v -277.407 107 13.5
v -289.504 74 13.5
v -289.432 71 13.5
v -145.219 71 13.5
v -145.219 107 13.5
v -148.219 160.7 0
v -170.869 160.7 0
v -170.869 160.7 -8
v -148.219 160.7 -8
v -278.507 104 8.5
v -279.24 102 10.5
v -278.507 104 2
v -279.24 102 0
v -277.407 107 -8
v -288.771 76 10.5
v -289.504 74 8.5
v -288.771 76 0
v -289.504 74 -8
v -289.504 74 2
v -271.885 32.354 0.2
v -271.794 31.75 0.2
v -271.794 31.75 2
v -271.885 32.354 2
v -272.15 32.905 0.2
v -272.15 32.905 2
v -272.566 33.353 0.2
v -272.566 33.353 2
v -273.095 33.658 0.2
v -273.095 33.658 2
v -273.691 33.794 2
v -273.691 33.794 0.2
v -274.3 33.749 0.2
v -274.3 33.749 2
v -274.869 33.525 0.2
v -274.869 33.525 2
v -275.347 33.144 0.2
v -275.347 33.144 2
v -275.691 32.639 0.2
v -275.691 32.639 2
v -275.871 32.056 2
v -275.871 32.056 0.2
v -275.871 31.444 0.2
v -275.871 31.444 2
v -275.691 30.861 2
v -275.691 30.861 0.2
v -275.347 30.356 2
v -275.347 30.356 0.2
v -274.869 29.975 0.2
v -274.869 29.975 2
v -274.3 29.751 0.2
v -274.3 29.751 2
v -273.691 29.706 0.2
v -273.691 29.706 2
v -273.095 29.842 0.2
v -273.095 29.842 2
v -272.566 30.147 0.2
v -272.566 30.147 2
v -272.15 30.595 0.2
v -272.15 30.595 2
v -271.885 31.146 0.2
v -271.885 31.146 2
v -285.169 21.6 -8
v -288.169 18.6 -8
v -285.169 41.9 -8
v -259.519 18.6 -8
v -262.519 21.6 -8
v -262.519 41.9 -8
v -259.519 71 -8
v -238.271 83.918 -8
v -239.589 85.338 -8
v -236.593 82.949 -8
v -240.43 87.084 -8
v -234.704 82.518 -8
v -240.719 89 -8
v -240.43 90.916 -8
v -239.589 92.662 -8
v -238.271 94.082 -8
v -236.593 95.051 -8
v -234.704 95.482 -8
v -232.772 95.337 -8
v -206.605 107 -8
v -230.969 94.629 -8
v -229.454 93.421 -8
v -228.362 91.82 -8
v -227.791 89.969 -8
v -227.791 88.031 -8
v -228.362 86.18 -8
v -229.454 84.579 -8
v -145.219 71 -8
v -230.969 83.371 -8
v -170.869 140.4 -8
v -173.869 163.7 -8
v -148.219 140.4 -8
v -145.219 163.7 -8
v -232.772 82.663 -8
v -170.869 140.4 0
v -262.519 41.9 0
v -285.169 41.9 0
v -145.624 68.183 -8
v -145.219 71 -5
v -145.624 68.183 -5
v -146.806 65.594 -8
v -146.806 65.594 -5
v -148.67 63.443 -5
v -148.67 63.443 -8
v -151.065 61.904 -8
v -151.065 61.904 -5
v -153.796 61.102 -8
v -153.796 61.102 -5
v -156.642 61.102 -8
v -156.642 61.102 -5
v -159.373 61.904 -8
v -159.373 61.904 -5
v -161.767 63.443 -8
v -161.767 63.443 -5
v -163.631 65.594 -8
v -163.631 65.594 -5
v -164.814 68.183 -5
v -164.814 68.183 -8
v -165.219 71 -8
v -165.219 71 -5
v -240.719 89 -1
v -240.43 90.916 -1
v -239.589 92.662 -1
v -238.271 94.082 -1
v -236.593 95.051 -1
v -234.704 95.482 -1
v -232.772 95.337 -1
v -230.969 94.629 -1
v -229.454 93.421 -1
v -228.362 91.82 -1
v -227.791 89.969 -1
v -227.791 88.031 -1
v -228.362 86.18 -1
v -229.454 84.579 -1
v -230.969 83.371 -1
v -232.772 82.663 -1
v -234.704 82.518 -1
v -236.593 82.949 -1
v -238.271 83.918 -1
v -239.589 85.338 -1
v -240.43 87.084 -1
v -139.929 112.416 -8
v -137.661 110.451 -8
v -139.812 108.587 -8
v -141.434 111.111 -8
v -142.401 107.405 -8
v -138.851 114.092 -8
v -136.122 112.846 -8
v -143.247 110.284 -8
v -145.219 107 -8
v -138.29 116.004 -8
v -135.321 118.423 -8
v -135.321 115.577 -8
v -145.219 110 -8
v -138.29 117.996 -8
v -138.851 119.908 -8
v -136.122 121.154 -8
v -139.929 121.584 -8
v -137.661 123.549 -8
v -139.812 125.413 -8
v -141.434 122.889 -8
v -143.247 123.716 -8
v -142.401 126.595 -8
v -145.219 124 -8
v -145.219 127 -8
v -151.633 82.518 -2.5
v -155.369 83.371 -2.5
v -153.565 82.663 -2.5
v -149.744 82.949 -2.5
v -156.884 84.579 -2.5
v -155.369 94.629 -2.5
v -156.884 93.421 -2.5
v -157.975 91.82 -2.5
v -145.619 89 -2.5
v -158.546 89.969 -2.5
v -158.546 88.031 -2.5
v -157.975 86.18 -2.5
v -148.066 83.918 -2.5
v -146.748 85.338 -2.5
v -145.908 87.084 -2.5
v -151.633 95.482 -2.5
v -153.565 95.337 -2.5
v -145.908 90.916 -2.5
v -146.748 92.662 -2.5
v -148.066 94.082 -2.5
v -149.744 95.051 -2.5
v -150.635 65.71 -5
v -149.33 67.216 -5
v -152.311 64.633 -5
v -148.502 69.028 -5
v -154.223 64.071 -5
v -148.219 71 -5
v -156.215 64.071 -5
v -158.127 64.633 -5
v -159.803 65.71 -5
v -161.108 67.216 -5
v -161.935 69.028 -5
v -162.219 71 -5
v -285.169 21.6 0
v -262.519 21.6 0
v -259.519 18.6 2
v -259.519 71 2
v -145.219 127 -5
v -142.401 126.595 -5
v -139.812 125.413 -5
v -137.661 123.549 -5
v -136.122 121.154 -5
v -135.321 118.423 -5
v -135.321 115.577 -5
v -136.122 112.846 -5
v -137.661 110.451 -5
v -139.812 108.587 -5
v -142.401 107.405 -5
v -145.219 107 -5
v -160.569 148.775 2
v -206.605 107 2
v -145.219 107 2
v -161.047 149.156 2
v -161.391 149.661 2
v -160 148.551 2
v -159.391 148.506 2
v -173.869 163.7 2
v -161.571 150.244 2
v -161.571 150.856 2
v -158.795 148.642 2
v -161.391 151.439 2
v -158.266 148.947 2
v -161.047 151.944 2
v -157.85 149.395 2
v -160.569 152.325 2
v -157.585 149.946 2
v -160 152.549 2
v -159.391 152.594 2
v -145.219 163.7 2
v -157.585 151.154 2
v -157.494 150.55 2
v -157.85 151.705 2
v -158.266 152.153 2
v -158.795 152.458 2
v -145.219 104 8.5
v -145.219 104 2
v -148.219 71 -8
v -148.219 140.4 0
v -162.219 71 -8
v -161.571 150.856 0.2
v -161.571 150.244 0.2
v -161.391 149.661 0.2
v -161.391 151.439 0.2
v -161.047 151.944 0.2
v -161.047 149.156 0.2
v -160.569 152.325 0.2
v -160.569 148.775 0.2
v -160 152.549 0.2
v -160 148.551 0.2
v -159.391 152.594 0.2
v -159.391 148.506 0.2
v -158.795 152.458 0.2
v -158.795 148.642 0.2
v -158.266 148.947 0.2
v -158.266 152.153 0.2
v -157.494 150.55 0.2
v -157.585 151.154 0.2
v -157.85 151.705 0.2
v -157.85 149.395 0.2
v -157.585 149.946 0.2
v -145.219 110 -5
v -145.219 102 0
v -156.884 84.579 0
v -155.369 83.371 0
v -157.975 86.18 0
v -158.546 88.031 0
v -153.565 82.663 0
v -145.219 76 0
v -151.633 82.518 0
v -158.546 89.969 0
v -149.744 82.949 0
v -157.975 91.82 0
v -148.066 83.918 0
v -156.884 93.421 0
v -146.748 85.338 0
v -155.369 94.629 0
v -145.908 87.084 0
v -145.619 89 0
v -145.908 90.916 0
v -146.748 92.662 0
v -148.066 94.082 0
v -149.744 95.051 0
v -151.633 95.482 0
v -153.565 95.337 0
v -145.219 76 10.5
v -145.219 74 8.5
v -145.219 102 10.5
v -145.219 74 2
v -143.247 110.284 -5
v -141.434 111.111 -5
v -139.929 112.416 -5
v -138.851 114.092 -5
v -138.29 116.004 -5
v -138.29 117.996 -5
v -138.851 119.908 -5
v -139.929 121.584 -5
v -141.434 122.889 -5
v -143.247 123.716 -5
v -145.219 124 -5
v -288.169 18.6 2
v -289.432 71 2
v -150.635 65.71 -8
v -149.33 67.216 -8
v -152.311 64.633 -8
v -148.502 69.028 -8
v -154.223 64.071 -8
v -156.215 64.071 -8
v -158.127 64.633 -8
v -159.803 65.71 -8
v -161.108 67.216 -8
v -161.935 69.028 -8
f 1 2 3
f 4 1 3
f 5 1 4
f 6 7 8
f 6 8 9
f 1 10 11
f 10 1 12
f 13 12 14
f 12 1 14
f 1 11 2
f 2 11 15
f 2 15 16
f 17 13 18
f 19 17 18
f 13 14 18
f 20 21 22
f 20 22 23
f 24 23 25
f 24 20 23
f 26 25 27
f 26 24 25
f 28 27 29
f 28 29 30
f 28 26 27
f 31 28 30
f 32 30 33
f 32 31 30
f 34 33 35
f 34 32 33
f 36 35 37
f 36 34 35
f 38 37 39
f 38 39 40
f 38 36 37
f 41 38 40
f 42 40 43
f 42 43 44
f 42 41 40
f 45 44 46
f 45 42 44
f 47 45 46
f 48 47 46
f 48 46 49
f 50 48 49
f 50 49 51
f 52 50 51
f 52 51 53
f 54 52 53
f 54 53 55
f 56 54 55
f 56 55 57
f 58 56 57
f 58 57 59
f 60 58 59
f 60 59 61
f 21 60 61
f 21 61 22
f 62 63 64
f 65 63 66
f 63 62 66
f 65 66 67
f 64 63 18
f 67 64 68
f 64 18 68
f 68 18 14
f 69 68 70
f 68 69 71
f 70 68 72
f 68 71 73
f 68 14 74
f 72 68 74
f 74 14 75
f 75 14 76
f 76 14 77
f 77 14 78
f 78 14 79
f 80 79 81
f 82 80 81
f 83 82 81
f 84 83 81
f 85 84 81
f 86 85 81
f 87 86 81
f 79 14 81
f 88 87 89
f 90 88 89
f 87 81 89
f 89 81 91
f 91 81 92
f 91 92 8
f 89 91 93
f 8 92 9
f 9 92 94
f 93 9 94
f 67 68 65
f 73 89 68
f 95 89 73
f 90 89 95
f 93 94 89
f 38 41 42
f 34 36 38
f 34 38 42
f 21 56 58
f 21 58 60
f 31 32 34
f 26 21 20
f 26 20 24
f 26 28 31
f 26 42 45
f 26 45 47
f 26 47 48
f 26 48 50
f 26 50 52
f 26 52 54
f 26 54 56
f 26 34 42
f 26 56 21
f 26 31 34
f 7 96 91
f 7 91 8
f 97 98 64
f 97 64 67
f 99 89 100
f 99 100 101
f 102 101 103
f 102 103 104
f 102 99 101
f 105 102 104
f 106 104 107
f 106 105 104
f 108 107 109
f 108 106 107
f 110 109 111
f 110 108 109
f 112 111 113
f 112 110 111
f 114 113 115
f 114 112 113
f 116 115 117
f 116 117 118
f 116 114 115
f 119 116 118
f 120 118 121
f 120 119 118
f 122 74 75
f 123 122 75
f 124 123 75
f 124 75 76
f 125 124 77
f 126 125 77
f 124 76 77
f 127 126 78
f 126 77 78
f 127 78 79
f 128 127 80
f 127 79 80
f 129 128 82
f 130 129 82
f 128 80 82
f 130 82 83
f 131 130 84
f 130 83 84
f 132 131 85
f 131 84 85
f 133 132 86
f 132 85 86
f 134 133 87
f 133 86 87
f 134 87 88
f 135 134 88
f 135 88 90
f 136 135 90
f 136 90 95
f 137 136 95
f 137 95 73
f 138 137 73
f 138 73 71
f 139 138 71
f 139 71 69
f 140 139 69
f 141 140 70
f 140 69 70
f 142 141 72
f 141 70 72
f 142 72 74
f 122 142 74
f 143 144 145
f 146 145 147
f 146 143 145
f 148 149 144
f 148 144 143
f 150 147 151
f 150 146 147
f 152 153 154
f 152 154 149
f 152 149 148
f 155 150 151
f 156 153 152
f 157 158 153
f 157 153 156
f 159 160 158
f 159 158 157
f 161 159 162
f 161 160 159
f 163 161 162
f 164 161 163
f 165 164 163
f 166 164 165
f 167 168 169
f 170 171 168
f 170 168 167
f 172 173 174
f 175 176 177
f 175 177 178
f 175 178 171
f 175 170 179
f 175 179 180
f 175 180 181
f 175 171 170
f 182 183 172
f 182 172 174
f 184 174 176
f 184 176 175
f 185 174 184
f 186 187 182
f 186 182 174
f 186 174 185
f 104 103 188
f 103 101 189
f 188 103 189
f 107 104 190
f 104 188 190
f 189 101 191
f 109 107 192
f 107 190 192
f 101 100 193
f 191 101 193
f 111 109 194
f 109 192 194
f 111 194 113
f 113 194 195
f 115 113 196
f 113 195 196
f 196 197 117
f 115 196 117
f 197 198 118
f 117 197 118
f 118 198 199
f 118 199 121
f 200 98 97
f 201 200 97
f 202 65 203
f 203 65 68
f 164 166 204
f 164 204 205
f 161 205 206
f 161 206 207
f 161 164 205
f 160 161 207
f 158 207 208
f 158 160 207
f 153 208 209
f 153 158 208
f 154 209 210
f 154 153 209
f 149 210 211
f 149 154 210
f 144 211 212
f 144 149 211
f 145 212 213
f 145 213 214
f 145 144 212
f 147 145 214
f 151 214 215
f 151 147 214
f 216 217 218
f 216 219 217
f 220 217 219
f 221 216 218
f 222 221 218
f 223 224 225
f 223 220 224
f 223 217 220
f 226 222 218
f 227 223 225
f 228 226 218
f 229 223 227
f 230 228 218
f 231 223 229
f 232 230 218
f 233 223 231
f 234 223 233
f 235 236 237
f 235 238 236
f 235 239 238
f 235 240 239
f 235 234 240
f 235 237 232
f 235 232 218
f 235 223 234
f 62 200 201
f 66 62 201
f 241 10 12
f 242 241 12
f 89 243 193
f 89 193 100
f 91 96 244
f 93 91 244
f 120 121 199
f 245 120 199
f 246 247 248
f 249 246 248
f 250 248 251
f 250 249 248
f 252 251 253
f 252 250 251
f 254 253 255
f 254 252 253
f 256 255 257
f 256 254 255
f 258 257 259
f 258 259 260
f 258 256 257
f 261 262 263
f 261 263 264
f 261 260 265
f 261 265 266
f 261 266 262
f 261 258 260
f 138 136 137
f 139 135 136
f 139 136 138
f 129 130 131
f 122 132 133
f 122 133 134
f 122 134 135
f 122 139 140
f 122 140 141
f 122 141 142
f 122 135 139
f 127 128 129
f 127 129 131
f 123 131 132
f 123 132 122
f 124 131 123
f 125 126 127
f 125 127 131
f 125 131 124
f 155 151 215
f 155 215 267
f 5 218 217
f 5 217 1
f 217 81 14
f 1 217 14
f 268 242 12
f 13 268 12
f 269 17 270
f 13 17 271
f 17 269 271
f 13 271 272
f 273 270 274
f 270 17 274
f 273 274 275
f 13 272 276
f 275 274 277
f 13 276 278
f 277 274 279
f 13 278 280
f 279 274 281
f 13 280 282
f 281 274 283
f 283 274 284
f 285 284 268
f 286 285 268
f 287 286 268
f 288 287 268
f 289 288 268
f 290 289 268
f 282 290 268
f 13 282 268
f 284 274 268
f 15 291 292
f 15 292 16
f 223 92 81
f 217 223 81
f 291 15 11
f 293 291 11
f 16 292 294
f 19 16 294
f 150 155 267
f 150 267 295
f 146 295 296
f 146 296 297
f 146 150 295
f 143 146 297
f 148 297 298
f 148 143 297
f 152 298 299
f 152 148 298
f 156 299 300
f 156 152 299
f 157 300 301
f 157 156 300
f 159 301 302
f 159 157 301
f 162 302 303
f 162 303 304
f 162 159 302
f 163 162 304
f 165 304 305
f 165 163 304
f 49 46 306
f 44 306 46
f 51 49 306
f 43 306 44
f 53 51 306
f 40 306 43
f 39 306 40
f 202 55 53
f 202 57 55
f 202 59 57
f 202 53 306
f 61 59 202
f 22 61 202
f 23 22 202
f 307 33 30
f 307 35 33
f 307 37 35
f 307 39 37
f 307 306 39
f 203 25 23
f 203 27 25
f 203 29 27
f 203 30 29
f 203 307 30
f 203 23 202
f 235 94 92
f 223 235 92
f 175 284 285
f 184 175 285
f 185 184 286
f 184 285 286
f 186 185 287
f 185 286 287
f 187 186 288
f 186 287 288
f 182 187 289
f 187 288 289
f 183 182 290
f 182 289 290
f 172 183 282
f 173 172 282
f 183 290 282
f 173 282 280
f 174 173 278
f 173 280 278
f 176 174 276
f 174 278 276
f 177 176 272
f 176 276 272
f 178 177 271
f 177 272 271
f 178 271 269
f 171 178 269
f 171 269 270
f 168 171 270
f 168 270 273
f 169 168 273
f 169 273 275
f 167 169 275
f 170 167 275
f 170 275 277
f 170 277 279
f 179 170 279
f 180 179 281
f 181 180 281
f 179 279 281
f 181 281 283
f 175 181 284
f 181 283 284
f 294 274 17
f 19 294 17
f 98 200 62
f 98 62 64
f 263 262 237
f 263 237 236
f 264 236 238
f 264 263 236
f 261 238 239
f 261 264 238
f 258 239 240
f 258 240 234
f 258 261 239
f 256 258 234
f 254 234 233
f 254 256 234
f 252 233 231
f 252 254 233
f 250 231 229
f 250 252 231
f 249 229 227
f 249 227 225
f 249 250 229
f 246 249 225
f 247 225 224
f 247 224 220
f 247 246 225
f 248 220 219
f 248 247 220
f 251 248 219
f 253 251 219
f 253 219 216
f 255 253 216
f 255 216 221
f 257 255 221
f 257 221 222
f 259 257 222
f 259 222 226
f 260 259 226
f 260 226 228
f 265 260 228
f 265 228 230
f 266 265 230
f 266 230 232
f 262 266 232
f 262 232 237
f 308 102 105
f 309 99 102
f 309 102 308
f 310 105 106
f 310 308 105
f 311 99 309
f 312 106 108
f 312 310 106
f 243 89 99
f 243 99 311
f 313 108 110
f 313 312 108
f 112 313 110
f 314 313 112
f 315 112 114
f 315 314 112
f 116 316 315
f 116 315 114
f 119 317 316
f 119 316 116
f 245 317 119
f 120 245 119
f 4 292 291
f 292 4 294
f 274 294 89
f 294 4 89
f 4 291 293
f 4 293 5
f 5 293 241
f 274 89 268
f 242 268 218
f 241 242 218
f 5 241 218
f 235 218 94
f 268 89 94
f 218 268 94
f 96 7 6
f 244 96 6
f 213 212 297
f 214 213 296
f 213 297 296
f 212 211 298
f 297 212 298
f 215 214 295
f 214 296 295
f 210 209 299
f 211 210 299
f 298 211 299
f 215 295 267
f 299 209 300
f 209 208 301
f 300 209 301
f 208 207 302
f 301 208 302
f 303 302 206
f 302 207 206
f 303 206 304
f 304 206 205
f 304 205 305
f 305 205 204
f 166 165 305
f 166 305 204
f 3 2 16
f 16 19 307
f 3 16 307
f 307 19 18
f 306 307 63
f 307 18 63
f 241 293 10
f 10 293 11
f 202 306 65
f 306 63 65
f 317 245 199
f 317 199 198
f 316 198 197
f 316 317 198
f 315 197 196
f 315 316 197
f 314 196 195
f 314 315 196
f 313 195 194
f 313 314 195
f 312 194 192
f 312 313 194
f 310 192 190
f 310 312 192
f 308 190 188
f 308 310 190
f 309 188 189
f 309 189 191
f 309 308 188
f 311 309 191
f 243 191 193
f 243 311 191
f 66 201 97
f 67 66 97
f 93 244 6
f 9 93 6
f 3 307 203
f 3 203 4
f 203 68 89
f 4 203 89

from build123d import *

# Parameters (mm, degrees)
SKETCH3_W             = 22.65000000000009
SKETCH3_H             = 20.30000000000004
SKETCH3_W_2           = 22.64999999999995
BOSS_EXTRUDE1_DEPTH   = 8
SKETCH3_4_R           = 2.049999999999966
SKETCH3_4_R_2         = 2.0499999999999923
BOSS_EXTRUDE2_DEPTH   = 2
BOSS_EXTRUDE3_DEPTH   = 13.5
SKETCH4_W             = 10.499999999999998
SKETCH4_H             = 30.000000000000014
CUT_EXTRUDE1_DEPTH    = 219.62824070668816
CHAMFER1_SIZE         = 2
SKETCH7_R             = 6.500000000000016
CUT_EXTRUDE3_DEPTH    = 2.5
SKETCH8_R             = 6.500000000000016
CUT_EXTRUDE4_DEPTH    = 7
BOSS_EXTRUDE4_DEPTH   = 3
BOSS_EXTRUDE4_2_DEPTH = 3
SKETCH3_9_R           = 2.0499999999999923
SKETCH3_9_R_2         = 2.049999999999966
BOSS_EXTRUDE5_DEPTH   = 0.2


with BuildPart() as part:
    # Sketch3 → Boss-Extrude1 (new body)
    with BuildSketch(Plane.XY):
        Polygon((-289.50446528221903, 74), (-288.1687500000001, 18.600000000000023), (-259.51875, 18.600000000000023), (-259.51875, 71), (-145.21875, 71), (-145.21875, 163.70000000000002), (-173.86874999999995, 163.70000000000002), (-206.60451026305154, 107), (-277.4071095129883, 106.99999999999999), align=None)
        with Locations((-273.84375000000006, 31.750000000000043)):
            Rectangle(SKETCH3_W, SKETCH3_H, mode=Mode.SUBTRACT)
        with Locations((-159.54375, 150.55)):
            Rectangle(SKETCH3_W_2, SKETCH3_H, mode=Mode.SUBTRACT)
    extrude(amount=-BOSS_EXTRUDE1_DEPTH)



with BuildPart() as body_2:
    # Sketch3<4> → Boss-Extrude2 (new body)
    with BuildSketch(Plane.XY):
        Polygon((-289.50446528221903, 74), (-288.1687500000001, 18.600000000000023), (-259.51875, 18.600000000000023), (-259.51875, 71), (-145.21875, 71), (-145.21875, 163.70000000000002), (-173.86874999999995, 163.70000000000002), (-206.60451026305154, 107), (-277.4071095129883, 106.99999999999999), align=None)
        with Locations((-273.84375, 31.749999999999986)):
            Circle(SKETCH3_4_R, mode=Mode.SUBTRACT)
        with Locations((-159.54375, 150.55)):
            Circle(SKETCH3_4_R_2, mode=Mode.SUBTRACT)
    extrude(amount=BOSS_EXTRUDE2_DEPTH)


with BuildPart() as part_1:
    add(part.part)

    add(body_2.part)  # Boss-Extrude3 merges body 2
    # Sketch3<8> → Boss-Extrude3 (add)
    with BuildSketch(Plane.XY):
        Polygon((-288.1687500000001, 77.64365611411853), (-288.1687500000001, 70.99999999999999), (-259.51875, 71), (-145.21875, 71), (-145.21875, 107), (-206.60451026305154, 107), (-277.4071095129883, 106.99999999999999), align=None)
        Polygon((-289.4321341297523, 70.99999999999999), (-288.1687500000001, 70.99999999999999), (-288.1687500000001, 77.64365611411853), (-289.50446528221903, 74), align=None)
    extrude(amount=BOSS_EXTRUDE3_DEPTH)

    # Sketch4 → Cut-Extrude1 (cut, through all)
    with BuildSketch(Plane(origin=(-145.21875, 0, 0), x_dir=(0, 0, -1), z_dir=(1, 0, 0))):
        with Locations((-5.249999999999999, 89)):
            Rectangle(SKETCH4_W, SKETCH4_H)
    extrude(amount=-CUT_EXTRUDE1_DEPTH, mode=Mode.SUBTRACT)

    # Chamfer1
    chamfer1_edges = [part_1.edges().sort_by_distance(p)[0] for p in [
        (-217.36160764110952, 74, 10.499999999999998),
        (-211.86280956418642, 104, 10.499999999999998),
        (-211.86280956418642, 104, 0),
        (-217.36160764110952, 74, 0),
    ]]
    chamfer(chamfer1_edges, length=CHAMFER1_SIZE)

    # Sketch7 → Cut-Extrude3 (cut)
    with BuildSketch(Plane.XY):
        with Locations((-152.11875000000003, 88.99999999999999)):
            Circle(SKETCH7_R)
    extrude(amount=-CUT_EXTRUDE3_DEPTH, mode=Mode.SUBTRACT)

    # Sketch8 → Cut-Extrude4 (cut)
    with BuildSketch(Plane(origin=(0, 0, -8), x_dir=(-1, 0, 0), z_dir=(0, 0, -1))):
        with Locations((234.21875, 89)):
            Circle(SKETCH8_R)
    extrude(amount=-CUT_EXTRUDE4_DEPTH, mode=Mode.SUBTRACT)

    # Sketch3<9> → Boss-Extrude5 (add)
    with BuildSketch(Plane.XY):
        with Locations((-159.54375, 150.55)):
            Circle(SKETCH3_9_R)
        with Locations((-273.84375, 31.749999999999986)):
            Circle(SKETCH3_9_R_2)
    extrude(amount=BOSS_EXTRUDE5_DEPTH)


with BuildPart() as body_2_2:
    # Sketch9 → Boss-Extrude4 (new body)
    with BuildSketch(Plane(origin=(0, 0, -8), x_dir=(-1, 0, 0), z_dir=(0, 0, -1))):
        with BuildLine():
            ThreePointArc((145.21875000000003, 71), (155.21875000000003, 60.999999999999986), (165.21875000000003, 71))
            Line((165.21875000000003, 71), (162.21875000000003, 71))
            ThreePointArc((162.21875000000006, 71), (155.21875000000003, 63.999999999999986), (148.21875, 71))
            Line((148.21875, 71), (145.21875, 71))
        make_face()
    extrude(amount=-BOSS_EXTRUDE4_DEPTH)


with BuildPart() as body_3:
    # Sketch9 → Boss-Extrude4 2 (new body)
    with BuildSketch(Plane(origin=(0, 0, -8), x_dir=(-1, 0, 0), z_dir=(0, 0, -1))):
        with BuildLine():
            Line((145.21875, 124.00000000000001), (145.21875, 127))
            ThreePointArc((145.21875, 127.00000000000001), (135.21875, 117), (145.21875, 106.99999999999999))
            Line((145.21875, 107), (145.21875, 109.99999999999997))
            ThreePointArc((145.21875, 109.99999999999999), (138.21874999999997, 117), (145.21875, 124.00000000000001))
        make_face()
    extrude(amount=-BOSS_EXTRUDE4_2_DEPTH)


solid = Compound([part_1.part, body_2_2.part, body_3.part])
